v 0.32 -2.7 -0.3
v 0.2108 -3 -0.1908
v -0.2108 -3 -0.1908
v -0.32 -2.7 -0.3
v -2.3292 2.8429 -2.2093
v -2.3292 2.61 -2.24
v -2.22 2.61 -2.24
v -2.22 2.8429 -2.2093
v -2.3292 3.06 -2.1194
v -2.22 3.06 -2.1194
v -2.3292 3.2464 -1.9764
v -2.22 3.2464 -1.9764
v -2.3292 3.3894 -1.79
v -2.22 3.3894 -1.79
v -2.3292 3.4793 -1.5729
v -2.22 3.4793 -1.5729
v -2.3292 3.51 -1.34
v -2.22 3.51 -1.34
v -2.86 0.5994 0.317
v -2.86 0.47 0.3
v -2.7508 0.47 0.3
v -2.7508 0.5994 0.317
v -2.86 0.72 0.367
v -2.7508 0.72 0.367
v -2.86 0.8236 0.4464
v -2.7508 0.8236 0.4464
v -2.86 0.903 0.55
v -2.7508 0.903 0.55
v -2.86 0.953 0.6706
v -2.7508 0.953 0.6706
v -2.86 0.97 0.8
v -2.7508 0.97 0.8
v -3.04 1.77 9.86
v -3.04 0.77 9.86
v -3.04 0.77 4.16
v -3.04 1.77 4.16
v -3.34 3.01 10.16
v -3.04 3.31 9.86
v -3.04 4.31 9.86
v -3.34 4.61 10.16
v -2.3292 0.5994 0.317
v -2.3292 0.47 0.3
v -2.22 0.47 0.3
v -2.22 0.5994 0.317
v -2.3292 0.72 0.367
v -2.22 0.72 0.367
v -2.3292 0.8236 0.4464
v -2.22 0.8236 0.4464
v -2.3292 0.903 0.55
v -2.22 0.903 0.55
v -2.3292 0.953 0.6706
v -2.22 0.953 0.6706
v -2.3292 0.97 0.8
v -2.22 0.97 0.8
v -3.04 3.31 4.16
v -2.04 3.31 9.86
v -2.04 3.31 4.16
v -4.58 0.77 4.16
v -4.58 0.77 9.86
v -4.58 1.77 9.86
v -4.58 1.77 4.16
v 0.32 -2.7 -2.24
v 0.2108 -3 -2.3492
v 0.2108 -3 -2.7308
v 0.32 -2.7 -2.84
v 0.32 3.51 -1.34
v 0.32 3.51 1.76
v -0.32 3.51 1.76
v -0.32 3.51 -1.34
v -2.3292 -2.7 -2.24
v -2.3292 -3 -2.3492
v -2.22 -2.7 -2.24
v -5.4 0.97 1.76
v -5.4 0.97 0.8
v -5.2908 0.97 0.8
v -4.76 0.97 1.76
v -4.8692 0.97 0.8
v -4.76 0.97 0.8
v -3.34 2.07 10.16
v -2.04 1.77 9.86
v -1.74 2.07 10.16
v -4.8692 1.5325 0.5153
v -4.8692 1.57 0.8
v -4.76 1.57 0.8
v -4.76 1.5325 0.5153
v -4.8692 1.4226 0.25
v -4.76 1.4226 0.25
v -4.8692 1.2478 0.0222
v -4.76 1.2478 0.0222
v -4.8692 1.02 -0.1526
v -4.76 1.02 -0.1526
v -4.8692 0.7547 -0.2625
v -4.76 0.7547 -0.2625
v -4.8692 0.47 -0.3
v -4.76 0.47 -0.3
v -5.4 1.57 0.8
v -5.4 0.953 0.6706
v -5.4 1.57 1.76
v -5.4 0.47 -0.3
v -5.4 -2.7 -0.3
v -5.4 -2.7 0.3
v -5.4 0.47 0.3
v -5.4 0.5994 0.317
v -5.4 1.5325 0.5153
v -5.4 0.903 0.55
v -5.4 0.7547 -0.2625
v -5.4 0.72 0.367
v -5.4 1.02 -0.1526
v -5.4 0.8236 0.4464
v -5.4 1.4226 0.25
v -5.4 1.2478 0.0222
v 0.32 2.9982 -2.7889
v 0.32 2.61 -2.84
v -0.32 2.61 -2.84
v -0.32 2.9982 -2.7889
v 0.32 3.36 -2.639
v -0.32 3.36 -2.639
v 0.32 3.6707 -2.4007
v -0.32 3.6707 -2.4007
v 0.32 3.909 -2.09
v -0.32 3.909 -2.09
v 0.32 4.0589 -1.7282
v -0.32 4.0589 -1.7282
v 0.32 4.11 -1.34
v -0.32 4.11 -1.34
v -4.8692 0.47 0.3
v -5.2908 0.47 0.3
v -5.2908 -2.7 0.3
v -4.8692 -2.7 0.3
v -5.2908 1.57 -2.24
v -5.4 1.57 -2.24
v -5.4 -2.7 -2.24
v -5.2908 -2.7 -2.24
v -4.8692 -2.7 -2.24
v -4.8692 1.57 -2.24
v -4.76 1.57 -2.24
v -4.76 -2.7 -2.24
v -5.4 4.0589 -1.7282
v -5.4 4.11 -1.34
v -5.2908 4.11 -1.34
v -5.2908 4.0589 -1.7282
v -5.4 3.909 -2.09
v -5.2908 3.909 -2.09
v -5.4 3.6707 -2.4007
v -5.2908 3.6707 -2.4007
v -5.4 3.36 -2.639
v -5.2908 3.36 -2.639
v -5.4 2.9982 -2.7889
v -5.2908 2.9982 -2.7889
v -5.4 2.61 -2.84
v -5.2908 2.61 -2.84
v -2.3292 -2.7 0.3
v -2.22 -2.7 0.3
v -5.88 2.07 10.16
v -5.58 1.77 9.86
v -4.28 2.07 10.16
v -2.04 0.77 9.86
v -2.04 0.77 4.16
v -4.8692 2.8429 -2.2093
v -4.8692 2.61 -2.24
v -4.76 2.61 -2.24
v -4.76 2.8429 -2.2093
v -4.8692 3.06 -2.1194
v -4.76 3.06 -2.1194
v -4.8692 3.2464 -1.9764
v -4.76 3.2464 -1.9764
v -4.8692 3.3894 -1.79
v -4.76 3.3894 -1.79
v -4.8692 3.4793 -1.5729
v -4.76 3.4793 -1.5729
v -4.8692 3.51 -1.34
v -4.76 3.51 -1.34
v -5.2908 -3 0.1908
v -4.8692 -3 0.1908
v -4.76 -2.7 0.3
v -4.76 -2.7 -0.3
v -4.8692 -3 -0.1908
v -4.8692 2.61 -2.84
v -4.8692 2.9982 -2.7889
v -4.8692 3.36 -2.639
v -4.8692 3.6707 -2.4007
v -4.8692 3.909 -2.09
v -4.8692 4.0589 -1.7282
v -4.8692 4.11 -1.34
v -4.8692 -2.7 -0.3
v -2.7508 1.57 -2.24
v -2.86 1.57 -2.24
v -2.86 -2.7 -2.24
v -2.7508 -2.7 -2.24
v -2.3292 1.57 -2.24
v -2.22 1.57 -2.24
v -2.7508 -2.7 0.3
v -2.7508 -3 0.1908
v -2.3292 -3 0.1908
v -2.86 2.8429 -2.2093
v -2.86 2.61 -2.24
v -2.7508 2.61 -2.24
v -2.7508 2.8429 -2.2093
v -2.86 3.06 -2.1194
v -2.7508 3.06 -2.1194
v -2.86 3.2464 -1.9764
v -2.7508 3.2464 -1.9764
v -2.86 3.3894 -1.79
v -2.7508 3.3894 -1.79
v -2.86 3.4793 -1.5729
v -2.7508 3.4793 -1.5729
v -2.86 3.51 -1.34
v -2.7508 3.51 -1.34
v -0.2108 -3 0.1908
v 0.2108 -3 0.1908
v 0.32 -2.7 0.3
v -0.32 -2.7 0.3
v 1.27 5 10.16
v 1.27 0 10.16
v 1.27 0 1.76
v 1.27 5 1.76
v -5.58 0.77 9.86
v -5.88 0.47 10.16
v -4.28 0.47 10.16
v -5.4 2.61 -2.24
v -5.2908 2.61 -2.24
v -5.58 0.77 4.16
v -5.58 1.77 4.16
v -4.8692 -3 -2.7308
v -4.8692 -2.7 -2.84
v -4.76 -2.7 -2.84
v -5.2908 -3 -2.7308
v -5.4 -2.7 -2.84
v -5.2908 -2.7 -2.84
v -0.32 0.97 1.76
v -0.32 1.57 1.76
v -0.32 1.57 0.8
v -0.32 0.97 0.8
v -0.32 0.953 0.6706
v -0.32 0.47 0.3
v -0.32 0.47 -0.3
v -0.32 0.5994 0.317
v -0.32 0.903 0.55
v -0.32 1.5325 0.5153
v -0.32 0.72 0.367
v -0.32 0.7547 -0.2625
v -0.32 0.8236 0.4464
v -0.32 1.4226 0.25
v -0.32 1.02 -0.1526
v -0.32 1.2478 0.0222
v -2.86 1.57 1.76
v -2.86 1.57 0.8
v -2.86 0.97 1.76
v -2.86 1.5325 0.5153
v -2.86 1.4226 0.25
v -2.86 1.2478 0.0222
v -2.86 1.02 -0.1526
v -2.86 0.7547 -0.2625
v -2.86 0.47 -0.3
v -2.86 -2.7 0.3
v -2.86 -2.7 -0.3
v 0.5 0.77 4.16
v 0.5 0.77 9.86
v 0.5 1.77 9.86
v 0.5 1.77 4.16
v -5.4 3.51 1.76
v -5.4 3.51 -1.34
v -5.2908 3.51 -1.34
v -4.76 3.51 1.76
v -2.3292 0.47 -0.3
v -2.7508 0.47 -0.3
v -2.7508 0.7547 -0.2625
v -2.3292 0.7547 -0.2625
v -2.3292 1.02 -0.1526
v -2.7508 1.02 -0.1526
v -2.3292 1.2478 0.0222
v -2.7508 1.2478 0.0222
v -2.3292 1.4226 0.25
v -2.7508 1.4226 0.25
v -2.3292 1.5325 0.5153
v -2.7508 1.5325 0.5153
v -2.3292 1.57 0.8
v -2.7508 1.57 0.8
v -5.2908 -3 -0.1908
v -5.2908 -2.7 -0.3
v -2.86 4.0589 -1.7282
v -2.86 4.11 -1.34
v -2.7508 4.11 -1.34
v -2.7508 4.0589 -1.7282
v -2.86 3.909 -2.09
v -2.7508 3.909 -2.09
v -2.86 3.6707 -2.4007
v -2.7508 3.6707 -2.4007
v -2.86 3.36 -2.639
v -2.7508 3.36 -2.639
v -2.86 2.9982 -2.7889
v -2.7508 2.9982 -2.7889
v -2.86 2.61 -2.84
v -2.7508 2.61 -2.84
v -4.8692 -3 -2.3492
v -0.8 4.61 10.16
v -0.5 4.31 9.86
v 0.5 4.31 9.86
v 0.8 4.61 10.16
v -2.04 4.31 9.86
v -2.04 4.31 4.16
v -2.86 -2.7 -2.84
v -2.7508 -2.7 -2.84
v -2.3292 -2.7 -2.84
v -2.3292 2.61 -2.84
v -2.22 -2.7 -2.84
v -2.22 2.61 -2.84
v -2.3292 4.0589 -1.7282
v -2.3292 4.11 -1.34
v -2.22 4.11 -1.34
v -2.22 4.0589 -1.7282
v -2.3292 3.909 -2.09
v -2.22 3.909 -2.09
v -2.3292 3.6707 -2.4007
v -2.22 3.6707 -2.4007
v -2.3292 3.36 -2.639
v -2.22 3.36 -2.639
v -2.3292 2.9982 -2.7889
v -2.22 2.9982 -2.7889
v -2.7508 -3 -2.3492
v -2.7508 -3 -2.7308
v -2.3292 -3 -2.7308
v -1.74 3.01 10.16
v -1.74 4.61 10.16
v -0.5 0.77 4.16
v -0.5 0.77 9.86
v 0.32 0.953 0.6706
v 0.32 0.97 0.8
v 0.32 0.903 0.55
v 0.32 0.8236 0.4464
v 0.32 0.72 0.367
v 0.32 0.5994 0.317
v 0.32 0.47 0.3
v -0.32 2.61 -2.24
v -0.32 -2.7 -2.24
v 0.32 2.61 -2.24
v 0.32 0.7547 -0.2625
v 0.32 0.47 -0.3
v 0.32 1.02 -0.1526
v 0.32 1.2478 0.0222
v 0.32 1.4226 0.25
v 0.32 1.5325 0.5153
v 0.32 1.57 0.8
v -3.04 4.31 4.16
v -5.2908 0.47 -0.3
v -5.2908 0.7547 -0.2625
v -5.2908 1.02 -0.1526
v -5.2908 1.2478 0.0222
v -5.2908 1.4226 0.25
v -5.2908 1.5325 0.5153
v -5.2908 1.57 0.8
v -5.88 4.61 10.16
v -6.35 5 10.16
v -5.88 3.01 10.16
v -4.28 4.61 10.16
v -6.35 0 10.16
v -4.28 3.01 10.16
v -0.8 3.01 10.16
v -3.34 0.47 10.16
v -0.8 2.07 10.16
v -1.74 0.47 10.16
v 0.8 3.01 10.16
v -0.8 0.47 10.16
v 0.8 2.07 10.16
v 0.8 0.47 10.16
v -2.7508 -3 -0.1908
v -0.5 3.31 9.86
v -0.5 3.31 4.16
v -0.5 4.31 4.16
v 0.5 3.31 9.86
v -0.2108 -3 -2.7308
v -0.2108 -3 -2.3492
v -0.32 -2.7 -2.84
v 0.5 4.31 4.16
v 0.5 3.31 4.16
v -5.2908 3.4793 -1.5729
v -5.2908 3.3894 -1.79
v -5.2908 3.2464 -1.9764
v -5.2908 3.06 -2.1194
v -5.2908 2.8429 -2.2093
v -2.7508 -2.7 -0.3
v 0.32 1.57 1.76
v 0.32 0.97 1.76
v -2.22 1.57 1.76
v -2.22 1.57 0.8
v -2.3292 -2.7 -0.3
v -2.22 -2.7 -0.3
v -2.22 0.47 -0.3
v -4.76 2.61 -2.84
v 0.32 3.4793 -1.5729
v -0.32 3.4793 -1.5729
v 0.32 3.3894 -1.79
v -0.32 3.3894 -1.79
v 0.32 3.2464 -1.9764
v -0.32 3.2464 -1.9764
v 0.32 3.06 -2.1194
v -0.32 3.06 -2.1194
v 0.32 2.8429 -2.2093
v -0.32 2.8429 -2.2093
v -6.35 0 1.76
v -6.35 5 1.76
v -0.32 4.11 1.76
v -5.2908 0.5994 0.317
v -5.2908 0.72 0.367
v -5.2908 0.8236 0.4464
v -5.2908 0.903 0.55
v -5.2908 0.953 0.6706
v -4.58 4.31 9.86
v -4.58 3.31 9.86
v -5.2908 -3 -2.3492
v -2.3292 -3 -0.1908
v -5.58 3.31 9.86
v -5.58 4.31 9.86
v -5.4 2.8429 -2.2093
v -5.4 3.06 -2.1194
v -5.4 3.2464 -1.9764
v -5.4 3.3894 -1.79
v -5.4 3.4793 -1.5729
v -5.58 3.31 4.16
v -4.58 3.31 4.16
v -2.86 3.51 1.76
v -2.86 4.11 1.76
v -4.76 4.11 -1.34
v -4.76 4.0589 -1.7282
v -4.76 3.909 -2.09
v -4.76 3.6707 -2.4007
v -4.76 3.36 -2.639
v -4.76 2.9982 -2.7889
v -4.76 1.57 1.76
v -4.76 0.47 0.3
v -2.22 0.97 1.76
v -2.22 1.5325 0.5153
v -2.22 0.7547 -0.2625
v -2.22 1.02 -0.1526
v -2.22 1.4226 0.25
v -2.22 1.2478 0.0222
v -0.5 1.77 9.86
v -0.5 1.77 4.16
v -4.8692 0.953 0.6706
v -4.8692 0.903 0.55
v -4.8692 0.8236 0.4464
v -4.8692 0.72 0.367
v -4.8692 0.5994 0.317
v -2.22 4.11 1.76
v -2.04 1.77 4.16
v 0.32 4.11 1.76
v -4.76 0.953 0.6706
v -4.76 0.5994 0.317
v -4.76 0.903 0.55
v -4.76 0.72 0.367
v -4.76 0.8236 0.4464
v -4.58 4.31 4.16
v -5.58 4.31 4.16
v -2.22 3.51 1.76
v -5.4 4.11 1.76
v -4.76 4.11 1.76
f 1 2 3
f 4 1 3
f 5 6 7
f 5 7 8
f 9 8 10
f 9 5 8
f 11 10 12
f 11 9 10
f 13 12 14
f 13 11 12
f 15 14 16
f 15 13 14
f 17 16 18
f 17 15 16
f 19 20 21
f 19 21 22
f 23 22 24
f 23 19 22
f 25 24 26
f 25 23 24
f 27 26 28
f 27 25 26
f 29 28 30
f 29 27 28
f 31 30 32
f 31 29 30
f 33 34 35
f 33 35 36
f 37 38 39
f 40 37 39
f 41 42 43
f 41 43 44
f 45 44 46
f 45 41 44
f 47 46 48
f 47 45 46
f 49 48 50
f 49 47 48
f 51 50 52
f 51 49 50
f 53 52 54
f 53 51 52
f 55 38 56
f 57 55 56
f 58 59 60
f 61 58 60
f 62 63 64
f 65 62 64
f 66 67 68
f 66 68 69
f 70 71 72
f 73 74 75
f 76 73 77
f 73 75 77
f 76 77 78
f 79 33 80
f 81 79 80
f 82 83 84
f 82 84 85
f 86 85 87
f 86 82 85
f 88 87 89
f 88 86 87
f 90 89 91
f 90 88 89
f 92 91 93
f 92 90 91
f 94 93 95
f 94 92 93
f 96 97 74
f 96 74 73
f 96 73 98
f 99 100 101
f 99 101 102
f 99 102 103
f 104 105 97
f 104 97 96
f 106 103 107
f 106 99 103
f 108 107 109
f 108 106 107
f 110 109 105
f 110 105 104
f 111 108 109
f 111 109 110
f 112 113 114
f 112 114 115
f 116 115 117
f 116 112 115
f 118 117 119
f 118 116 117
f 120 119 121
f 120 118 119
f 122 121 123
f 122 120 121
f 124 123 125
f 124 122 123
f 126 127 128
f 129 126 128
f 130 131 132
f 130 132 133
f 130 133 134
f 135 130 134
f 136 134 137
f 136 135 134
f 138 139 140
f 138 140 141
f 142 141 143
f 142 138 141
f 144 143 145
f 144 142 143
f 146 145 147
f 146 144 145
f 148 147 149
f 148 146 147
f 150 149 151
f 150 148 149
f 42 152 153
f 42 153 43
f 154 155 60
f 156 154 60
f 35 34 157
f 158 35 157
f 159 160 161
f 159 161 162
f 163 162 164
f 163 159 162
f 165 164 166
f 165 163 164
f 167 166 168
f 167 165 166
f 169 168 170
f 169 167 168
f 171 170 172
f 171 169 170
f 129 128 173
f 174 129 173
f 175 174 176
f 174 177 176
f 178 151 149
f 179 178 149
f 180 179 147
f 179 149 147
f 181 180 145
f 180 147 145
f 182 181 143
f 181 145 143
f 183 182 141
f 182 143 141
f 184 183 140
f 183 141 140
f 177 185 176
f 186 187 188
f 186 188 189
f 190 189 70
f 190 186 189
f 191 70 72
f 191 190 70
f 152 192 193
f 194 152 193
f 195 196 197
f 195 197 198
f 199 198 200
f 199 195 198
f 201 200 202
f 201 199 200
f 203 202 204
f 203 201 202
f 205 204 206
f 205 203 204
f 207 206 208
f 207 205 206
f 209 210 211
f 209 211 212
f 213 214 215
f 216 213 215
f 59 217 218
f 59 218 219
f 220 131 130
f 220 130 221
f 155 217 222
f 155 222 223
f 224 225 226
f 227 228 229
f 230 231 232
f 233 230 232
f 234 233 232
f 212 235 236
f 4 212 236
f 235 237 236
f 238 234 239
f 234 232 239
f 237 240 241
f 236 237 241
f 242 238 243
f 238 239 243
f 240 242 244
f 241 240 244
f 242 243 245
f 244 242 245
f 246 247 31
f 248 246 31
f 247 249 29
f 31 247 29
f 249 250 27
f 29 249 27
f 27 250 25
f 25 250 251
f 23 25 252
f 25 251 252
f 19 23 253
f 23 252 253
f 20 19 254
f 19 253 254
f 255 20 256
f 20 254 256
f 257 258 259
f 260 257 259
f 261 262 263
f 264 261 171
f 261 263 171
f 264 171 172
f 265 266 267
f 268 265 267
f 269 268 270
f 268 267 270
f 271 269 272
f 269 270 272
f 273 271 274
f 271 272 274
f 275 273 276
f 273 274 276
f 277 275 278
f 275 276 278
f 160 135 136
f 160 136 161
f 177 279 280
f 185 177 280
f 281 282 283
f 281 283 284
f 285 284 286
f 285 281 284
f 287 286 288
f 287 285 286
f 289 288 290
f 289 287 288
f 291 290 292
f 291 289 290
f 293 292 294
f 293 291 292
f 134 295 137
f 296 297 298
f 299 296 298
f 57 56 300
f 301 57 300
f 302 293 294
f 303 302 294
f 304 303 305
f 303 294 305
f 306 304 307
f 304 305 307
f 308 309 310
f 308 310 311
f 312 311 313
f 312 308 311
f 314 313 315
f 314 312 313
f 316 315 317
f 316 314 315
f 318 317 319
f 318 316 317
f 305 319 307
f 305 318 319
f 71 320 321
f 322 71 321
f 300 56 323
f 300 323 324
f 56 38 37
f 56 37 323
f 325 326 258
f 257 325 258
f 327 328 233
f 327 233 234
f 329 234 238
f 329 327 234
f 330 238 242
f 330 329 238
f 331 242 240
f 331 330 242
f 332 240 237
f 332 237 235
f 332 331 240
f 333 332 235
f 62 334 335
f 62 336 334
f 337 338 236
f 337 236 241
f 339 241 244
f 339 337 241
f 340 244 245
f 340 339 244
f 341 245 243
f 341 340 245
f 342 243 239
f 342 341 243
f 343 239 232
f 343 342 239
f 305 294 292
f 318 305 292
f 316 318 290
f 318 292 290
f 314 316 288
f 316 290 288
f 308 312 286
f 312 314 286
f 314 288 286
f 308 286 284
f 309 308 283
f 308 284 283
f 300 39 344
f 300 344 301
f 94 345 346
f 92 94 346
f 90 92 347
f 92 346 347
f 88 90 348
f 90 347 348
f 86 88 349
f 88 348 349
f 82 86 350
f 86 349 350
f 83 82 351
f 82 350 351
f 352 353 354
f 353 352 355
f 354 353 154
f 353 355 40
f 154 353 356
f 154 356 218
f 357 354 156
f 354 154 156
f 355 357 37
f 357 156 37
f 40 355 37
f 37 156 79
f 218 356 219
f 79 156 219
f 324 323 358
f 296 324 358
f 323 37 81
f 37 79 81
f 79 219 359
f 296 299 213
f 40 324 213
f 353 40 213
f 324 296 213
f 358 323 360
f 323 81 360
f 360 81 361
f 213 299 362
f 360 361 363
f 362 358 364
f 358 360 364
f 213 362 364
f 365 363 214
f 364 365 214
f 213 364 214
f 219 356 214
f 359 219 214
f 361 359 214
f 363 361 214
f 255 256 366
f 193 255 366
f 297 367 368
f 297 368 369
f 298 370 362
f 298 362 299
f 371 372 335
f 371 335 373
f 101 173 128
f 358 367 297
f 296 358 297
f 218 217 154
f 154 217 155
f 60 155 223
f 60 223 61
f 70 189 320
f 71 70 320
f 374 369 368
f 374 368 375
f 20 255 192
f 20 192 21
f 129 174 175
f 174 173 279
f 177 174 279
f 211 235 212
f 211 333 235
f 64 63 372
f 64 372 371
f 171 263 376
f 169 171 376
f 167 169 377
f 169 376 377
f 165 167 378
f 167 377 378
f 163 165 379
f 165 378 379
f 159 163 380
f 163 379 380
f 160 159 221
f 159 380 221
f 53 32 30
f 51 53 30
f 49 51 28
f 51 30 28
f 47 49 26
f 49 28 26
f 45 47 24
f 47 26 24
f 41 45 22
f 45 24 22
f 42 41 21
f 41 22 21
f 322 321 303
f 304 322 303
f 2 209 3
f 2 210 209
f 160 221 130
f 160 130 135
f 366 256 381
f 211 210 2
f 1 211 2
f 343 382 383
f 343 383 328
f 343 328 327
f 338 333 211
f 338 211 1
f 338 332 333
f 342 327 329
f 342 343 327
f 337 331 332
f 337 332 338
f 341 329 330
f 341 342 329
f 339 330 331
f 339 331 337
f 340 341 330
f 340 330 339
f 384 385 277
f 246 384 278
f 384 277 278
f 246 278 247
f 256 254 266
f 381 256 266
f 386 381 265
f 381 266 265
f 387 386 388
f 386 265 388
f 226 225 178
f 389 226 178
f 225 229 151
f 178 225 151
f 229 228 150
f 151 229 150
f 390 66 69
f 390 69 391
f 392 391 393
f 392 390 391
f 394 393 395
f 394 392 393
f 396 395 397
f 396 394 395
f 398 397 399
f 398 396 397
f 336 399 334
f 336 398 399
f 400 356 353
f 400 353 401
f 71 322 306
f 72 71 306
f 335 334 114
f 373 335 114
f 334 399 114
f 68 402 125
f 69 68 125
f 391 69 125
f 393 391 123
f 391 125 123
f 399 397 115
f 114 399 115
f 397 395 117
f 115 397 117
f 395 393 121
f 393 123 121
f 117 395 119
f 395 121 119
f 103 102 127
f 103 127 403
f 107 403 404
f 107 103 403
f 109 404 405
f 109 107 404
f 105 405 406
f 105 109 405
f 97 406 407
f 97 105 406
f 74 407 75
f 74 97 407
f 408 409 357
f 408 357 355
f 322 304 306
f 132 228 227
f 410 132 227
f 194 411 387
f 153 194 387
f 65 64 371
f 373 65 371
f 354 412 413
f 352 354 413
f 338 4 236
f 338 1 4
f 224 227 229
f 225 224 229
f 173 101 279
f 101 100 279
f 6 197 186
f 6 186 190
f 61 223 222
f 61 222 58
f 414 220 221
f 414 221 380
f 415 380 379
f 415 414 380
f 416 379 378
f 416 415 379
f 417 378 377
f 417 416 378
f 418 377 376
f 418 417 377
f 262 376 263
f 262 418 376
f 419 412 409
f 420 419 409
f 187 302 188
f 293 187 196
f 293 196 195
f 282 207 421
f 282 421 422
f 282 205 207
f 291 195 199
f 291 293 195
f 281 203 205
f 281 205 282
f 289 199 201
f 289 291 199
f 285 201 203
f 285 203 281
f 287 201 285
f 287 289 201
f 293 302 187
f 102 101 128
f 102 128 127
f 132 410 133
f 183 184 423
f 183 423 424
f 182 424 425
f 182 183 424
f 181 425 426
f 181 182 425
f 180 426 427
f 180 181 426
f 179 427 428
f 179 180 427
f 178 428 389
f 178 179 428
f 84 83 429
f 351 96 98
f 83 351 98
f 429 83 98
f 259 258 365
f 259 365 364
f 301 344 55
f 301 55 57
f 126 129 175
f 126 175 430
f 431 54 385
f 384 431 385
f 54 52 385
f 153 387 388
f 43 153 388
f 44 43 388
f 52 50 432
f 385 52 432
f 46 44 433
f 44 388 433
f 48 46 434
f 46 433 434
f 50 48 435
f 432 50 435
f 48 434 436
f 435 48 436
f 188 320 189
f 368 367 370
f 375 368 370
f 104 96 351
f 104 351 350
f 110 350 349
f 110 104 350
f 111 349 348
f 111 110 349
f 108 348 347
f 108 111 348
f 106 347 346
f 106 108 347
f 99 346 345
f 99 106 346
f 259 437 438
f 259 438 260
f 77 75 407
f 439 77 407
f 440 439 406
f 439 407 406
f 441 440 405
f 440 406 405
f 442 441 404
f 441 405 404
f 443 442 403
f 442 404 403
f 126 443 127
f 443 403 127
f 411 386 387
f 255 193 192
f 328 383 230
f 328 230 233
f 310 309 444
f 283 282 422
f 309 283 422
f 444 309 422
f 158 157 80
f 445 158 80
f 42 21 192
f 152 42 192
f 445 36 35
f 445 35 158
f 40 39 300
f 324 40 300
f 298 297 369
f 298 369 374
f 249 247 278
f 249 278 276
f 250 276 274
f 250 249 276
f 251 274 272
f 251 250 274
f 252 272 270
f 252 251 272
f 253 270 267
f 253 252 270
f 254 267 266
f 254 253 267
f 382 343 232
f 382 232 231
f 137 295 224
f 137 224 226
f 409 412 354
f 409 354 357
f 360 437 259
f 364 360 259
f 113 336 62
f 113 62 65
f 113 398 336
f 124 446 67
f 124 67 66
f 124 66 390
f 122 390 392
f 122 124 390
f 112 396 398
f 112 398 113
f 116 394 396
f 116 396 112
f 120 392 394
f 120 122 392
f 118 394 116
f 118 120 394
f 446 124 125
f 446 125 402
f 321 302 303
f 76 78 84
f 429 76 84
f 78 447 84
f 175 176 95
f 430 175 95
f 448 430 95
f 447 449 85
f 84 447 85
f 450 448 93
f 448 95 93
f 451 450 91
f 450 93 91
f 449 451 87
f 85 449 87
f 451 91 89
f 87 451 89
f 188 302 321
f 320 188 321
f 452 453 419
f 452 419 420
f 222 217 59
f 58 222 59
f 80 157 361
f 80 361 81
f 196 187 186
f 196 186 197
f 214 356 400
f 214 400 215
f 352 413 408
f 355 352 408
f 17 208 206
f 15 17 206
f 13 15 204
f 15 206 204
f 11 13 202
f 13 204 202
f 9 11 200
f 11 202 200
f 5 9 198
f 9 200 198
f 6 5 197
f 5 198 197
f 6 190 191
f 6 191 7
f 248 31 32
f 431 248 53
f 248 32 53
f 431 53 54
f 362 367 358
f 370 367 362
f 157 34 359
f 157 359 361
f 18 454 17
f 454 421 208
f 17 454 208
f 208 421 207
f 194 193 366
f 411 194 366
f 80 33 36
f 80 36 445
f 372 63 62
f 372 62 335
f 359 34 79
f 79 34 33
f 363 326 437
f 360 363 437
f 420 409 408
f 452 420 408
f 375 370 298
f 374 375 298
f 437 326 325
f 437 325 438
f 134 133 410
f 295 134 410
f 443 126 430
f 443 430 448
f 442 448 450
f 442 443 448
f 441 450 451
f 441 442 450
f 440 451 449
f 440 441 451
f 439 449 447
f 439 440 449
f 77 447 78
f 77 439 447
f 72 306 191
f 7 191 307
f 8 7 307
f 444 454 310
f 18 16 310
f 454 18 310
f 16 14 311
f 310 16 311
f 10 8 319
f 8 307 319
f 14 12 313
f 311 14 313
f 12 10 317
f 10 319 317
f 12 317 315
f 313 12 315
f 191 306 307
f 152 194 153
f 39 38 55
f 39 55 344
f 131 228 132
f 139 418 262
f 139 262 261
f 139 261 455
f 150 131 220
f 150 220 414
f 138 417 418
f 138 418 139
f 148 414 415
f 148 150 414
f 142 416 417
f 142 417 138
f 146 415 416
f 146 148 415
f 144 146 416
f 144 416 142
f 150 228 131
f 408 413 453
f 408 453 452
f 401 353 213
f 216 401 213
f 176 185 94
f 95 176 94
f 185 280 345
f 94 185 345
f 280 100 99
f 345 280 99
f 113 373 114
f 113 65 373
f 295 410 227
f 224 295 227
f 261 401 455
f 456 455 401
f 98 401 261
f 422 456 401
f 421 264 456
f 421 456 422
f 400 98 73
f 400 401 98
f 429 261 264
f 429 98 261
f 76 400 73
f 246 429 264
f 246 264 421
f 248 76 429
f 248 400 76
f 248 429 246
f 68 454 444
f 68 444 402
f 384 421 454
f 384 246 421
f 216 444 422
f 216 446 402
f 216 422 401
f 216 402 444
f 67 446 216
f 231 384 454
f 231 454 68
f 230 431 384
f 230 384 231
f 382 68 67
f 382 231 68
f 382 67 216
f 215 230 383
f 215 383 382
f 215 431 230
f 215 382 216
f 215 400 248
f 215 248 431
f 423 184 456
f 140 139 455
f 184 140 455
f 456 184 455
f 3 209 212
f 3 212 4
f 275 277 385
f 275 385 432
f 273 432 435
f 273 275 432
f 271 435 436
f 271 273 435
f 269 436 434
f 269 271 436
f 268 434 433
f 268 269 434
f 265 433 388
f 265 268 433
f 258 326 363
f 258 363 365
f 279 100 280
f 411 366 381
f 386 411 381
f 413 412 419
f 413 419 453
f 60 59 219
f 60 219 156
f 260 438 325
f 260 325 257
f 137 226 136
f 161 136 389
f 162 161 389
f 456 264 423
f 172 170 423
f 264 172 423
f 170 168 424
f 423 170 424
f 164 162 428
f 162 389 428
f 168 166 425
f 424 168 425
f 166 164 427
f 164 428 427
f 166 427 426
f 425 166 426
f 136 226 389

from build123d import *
from OCP.BRepFilletAPI import BRepFilletAPI_MakeChamfer
from build123d.topology import SkipClean

# Parameters (mm, degrees)
EXTRUDE_2563_DEPTH                    = 0.32
EXTRUDE_2563_2_DEPTH                  = 0.32
SKETCH_2_W                            = 2.54
SKETCH_2_H                            = 8.4
EXTRUDE_2921_DEPTH                    = 5
SKETCH_3_W                            = 1
SKETCH_3_H                            = 1
CUT_EXTRUDE_3170_DEPTH                = 6
CHAMFER_1_SIZE                        = 0.3
CHAMFER_2_SIZE                        = 0.3
CHAMFER_2_SIZE2                       = 0.10919107
PATTERN_LINEAR_3747_COUNT             = 3
PATTERN_LINEAR_3747_PITCH             = 2.54
CHAMFER_1_OF_PATTERN_LINEAR_3747_SIZE = 0.3
PATTERN_START                         = -5.29080893
PATTERN_LINEAR_12180_DEPTH            = 0.42161786
PATTERN_START_2                       = -2.75080893
PATTERN_LINEAR_12180_2_DEPTH          = 0.42161786
PATTERN_START_3                       = -0.19080893
PATTERN_LINEAR_12180_3_OUTLINE_W      = 0.10919107
PATTERN_LINEAR_12180_3_OUTLINE_H      = 0.6
PATTERN_LINEAR_12180_3_DEPTH          = 0.99080893
PATTERN_START_4                       = -2.84
PATTERN_LINEAR_12180_4_DEPTH          = 0.6
PATTERN_START_5                       = -2.73080893
PATTERN_LINEAR_12180_5_OUTLINE_W      = 0.10919107
PATTERN_LINEAR_12180_5_OUTLINE_H      = 2.54
PATTERN_LINEAR_12180_5_DEPTH          = 1.39080893
PATTERN_START_6                       = -1.484615596
PATTERN_LINEAR_12180_6_OUTLINE_W      = 0.10919107
PATTERN_LINEAR_12180_6_OUTLINE_H      = 0.6
PATTERN_LINEAR_12180_6_DEPTH          = 4.484615596
PATTERN_START_7                       = 0.719658002
PATTERN_LINEAR_12180_7_OUTLINE_W      = 0.10919107
PATTERN_LINEAR_12180_7_OUTLINE_H      = 0.6
PATTERN_LINEAR_12180_7_DEPTH          = 2.280341998
PATTERN_START_8                       = -0.3
PATTERN_LINEAR_12180_8_DEPTH          = 0.49080893
PATTERN_START_9                       = -5.4
PATTERN_LINEAR_12180_9_DEPTH          = 3.18


with BuildPart() as part:
    # Эскиз1 → Extrude 2563 (new, symmetric)
    with BuildSketch(Plane(origin=(0, 0, 0), x_dir=(0, 0, -1), z_dir=(1, 0, 0))):
        with BuildLine():
            Line((0.3, -3), (0.3, 0.47))
            ThreePointArc((0.3, 0.47), (-0.022182541, 1.247817459), (-0.8, 1.57))
            Line((-0.8, 1.57), (-4.16, 1.57))
            Line((-4.16, 1.57), (-4.16, 0.97))
            Line((-4.16, 0.97), (-0.8, 0.97))
            ThreePointArc((-0.8, 0.97), (-0.446446609, 0.823553391), (-0.3, 0.47))
            Line((-0.3, 0.47), (-0.3, -3))
            Line((-0.3, -3), (0.3, -3))
        make_face()
    extrude(amount=EXTRUDE_2563_DEPTH, both=True)



with BuildPart() as body_2:
    # Эскиз1 → Extrude 2563 2 (new, symmetric)
    with BuildSketch(Plane(origin=(0, 0, 0), x_dir=(0, 0, -1), z_dir=(1, 0, 0))):
        with BuildLine():
            Line((2.84, -3), (2.84, 2.61))
            ThreePointArc((2.84, 2.61), (2.400660172, 3.670660172), (1.34, 4.11))
            Line((1.34, 4.11), (-4.16, 4.11))
            Line((-4.16, 4.11), (-4.16, 3.51))
            Line((-4.16, 3.51), (1.34, 3.51))
            ThreePointArc((1.34, 3.51), (1.976396103, 3.246396103), (2.24, 2.61))
            Line((2.24, 2.61), (2.24, -3))
            Line((2.24, -3), (2.84, -3))
        make_face()
    extrude(amount=EXTRUDE_2563_2_DEPTH, both=True)


with BuildPart() as part_1:
    add(part.part)

    add(body_2.part)  # Extrude 2921 merges body 2
    # Эскиз2 → Extrude 2921 (add)
    with BuildSketch(Plane(origin=(0, 0, 0), x_dir=(1, 0, 0), z_dir=(0, 1, 0))):
        with Locations((0, -5.96)):
            Rectangle(SKETCH_2_W, SKETCH_2_H)
    extrude_2921 = extrude(amount=EXTRUDE_2921_DEPTH)

    # Эскиз3 → Cut-Extrude 3170 (cut)
    with BuildSketch(Plane.XY.offset(10.16)):
        with Locations((0, 1.27)):
            Rectangle(SKETCH_3_W, SKETCH_3_H)
        with Locations((0, 3.81)):
            Rectangle(SKETCH_3_W, SKETCH_3_H)
    cut_extrude_3170 = extrude(amount=-CUT_EXTRUDE_3170_DEPTH, mode=Mode.SUBTRACT)

    # Фаска1
    chamfer_1_edges = [part_1.edges().sort_by_distance(p)[0] for p in [
        (-0.5, 1.27, 10.16),
        (0, 0.77, 10.16),
        (0.5, 1.27, 10.16),
        (0, 1.77, 10.16),
        (-0.5, 3.81, 10.16),
        (0, 3.31, 10.16),
        (0.5, 3.81, 10.16),
        (0, 4.31, 10.16),
    ]]
    chamfer(chamfer_1_edges, length=CHAMFER_1_SIZE)

    # Фаска2: one chamfer whose edges measure the first distance from different faces: ONE call of the kernel's chamfer builder (chamfer() names one face for all edges)
    chamfer_2_edges_1 = [part_1.edges().sort_by_distance(p)[0] for p in [
        (-0.32, -3, 0),
    ]]
    chamfer_2_side_1 = [part_1.faces().sort_by_distance(p)[0] for p in [
        (-0.32, -0.335827759, 0.275050022),
    ]]
    chamfer_2_edges_2 = [part_1.edges().sort_by_distance(p)[0] for p in [
        (0, -3, 0.3),
    ]]
    chamfer_2_side_2 = [part_1.faces().sort_by_distance(p)[0] for p in [
        (0, -1.265, 0.3),
    ]]
    chamfer_2_edges_3 = [part_1.edges().sort_by_distance(p)[0] for p in [
        (0, -3, -0.3),
    ]]
    chamfer_2_side_3 = [part_1.faces().sort_by_distance(p)[0] for p in [
        (0, -1.265, -0.3),
    ]]
    chamfer_2_edges_4 = [part_1.edges().sort_by_distance(p)[0] for p in [
        (0.32, -3, 0),
    ]]
    chamfer_2_side_4 = [part_1.faces().sort_by_distance(p)[0] for p in [
        (0.32, -0.335827759, 0.275050022),
    ]]
    chamfer_2_edges_5 = [part_1.edges().sort_by_distance(p)[0] for p in [
        (0.32, -3, -2.54),
    ]]
    chamfer_2_side_5 = [part_1.faces().sort_by_distance(p)[0] for p in [
        (0.32, -2.915317003, -2.54),
    ]]
    chamfer_2_edges_6 = [part_1.edges().sort_by_distance(p)[0] for p in [
        (-0.32, -3, -2.54),
    ]]
    chamfer_2_side_6 = [part_1.faces().sort_by_distance(p)[0] for p in [
        (-0.32, -2.915317003, -2.54),
    ]]
    chamfer_2_edges_7 = [part_1.edges().sort_by_distance(p)[0] for p in [
        (0, -3, -2.24),
    ]]
    chamfer_2_side_7 = [part_1.faces().sort_by_distance(p)[0] for p in [
        (0, -0.195, -2.24),
    ]]
    chamfer_2_edges_8 = [part_1.edges().sort_by_distance(p)[0] for p in [
        (0, -3, -2.84),
    ]]
    chamfer_2_side_8 = [part_1.faces().sort_by_distance(p)[0] for p in [
        (0, -0.195, -2.84),
    ]]
    chamfer_2 = BRepFilletAPI_MakeChamfer(part_1.part.solid().wrapped)
    for e in chamfer_2_edges_1:
        chamfer_2.Add(CHAMFER_2_SIZE, CHAMFER_2_SIZE2, e.wrapped, chamfer_2_side_1[0].wrapped)  # the first distance lies on this face
    for e in chamfer_2_edges_2:
        chamfer_2.Add(CHAMFER_2_SIZE, CHAMFER_2_SIZE2, e.wrapped, chamfer_2_side_2[0].wrapped)  # the first distance lies on this face
    for e in chamfer_2_edges_3:
        chamfer_2.Add(CHAMFER_2_SIZE, CHAMFER_2_SIZE2, e.wrapped, chamfer_2_side_3[0].wrapped)  # the first distance lies on this face
    for e in chamfer_2_edges_4:
        chamfer_2.Add(CHAMFER_2_SIZE, CHAMFER_2_SIZE2, e.wrapped, chamfer_2_side_4[0].wrapped)  # the first distance lies on this face
    for e in chamfer_2_edges_5:
        chamfer_2.Add(CHAMFER_2_SIZE, CHAMFER_2_SIZE2, e.wrapped, chamfer_2_side_5[0].wrapped)  # the first distance lies on this face
    for e in chamfer_2_edges_6:
        chamfer_2.Add(CHAMFER_2_SIZE, CHAMFER_2_SIZE2, e.wrapped, chamfer_2_side_6[0].wrapped)  # the first distance lies on this face
    for e in chamfer_2_edges_7:
        chamfer_2.Add(CHAMFER_2_SIZE, CHAMFER_2_SIZE2, e.wrapped, chamfer_2_side_7[0].wrapped)  # the first distance lies on this face
    for e in chamfer_2_edges_8:
        chamfer_2.Add(CHAMFER_2_SIZE, CHAMFER_2_SIZE2, e.wrapped, chamfer_2_side_8[0].wrapped)  # the first distance lies on this face
    add(Compound.cast(chamfer_2.Shape()), mode=Mode.REPLACE)

    # Pattern Linear 3747: Extrude 2921, Cut-Extrude 3170 ×3
    with Locations(*[(-i * PATTERN_LINEAR_3747_PITCH, 0, 0) for i in range(1, PATTERN_LINEAR_3747_COUNT)]):
        add(extrude_2921)
        add(cut_extrude_3170, mode=Mode.SUBTRACT)

    # Фаска1 of Pattern Linear 3747
    chamfer_1_of_pattern_linear_3747_edges = [part_1.edges().sort_by_distance(p)[0] for p in [
        (-3.04, 1.27, 10.16),
        (-2.54, 0.77, 10.16),
        (-2.04, 1.27, 10.16),
        (-2.54, 1.77, 10.16),
        (-3.04, 3.81, 10.16),
        (-2.54, 3.31, 10.16),
        (-2.04, 3.81, 10.16),
        (-2.54, 4.31, 10.16),
        (-5.58, 1.27, 10.16),
        (-5.08, 0.77, 10.16),
        (-4.58, 1.27, 10.16),
        (-5.08, 1.77, 10.16),
        (-5.58, 3.81, 10.16),
        (-5.08, 3.31, 10.16),
        (-4.58, 3.81, 10.16),
        (-5.08, 4.31, 10.16),
    ]]
    chamfer(chamfer_1_of_pattern_linear_3747_edges, length=CHAMFER_1_OF_PATTERN_LINEAR_3747_SIZE)

    # Pattern Linear 12180: read off the stored shape, not the designer's step
    # Pattern Linear 12180 outline → Pattern Linear 12180 (add)
    with BuildSketch(Plane.YZ.offset(PATTERN_START)):
        with BuildLine():
            Line((4.11, 1.76), (3.51, 1.76))
            Line((3.51, 1.76), (3.51, -1.34))
            ThreePointArc((3.51, -1.34), (3.246396103, -1.976396103), (2.61, -2.24))
            Line((2.61, -2.24), (-2.7, -2.24))
            Line((-2.7, -2.24), (-3, -2.34919107))
            Line((-3, -2.34919107), (-3, -2.73080893))
            Line((-3, -2.73080893), (-2.7, -2.84))
            Line((-2.7, -2.84), (2.61, -2.84))
            ThreePointArc((2.61, -2.84), (3.670660172, -2.400660172), (4.11, -1.34))
            Line((4.11, -1.34), (4.11, 1.76))
        make_face()
        with BuildLine():
            Line((1.57, 0.8), (1.57, 1.76))
            Line((1.57, 1.76), (0.97, 1.76))
            Line((0.97, 1.76), (0.97, 0.8))
            ThreePointArc((0.97, 0.8), (0.823553391, 0.446446609), (0.47, 0.3))
            Line((0.47, 0.3), (-2.7, 0.3))
            Line((-2.7, 0.3), (-3, 0.19080893))
            Line((-3, 0.19080893), (-3, -0.19080893))
            Line((-3, -0.19080893), (-2.7, -0.3))
            Line((-2.7, -0.3), (0.47, -0.3))
            ThreePointArc((0.47, -0.3), (1.247817459, 0.022182541), (1.57, 0.8))
        make_face()
    extrude(amount=PATTERN_LINEAR_12180_DEPTH)

    # Pattern Linear 12180 2 outline → Pattern Linear 12180 2 (add)
    with BuildSketch(Plane.YZ.offset(PATTERN_START_2)):
        with BuildLine():
            Line((4.11, 1.76), (3.51, 1.76))
            Line((3.51, 1.76), (3.51, -1.34))
            ThreePointArc((3.51, -1.34), (3.246396103, -1.976396103), (2.61, -2.24))
            Line((2.61, -2.24), (-2.7, -2.24))
            Line((-2.7, -2.24), (-3, -2.34919107))
            Line((-3, -2.34919107), (-3, -2.73080893))
            Line((-3, -2.73080893), (-2.7, -2.84))
            Line((-2.7, -2.84), (2.61, -2.84))
            ThreePointArc((2.61, -2.84), (3.670660172, -2.400660172), (4.11, -1.34))
            Line((4.11, -1.34), (4.11, 1.76))
        make_face()
        with BuildLine():
            Line((1.57, 0.8), (1.57, 1.76))
            Line((1.57, 1.76), (0.97, 1.76))
            Line((0.97, 1.76), (0.97, 0.8))
            ThreePointArc((0.97, 0.8), (0.823553391, 0.446446609), (0.47, 0.3))
            Line((0.47, 0.3), (-2.7, 0.3))
            Line((-2.7, 0.3), (-3, 0.19080893))
            Line((-3, 0.19080893), (-3, -0.19080893))
            Line((-3, -0.19080893), (-2.7, -0.3))
            Line((-2.7, -0.3), (0.47, -0.3))
            ThreePointArc((0.47, -0.3), (1.247817459, 0.022182541), (1.57, 0.8))
        make_face()
    extrude(amount=PATTERN_LINEAR_12180_2_DEPTH)

    # Pattern Linear 12180 3 outline → Pattern Linear 12180 3 (add)
    with BuildSketch(Plane.XY.offset(PATTERN_START_3)):
        Polygon((-2.75080893, 1.57), (-2.86, 1.57), (-2.86, -2.7), (-2.75080893, -3), align=None)
        with Locations((-2.805404465, 3.81)):
            Rectangle(PATTERN_LINEAR_12180_3_OUTLINE_W, PATTERN_LINEAR_12180_3_OUTLINE_H)
        Polygon((-2.22, 1.57), (-2.32919107, 1.57), (-2.32919107, -3), (-2.22, -2.7), align=None)
        with Locations((-2.274595535, 3.81)):
            Rectangle(PATTERN_LINEAR_12180_3_OUTLINE_W, PATTERN_LINEAR_12180_3_OUTLINE_H)
        Polygon((-5.29080893, 1.57), (-5.4, 1.57), (-5.4, -2.7), (-5.29080893, -3), align=None)
        with Locations((-5.345404465, 3.81)):
            Rectangle(PATTERN_LINEAR_12180_3_OUTLINE_W, PATTERN_LINEAR_12180_3_OUTLINE_H)
        Polygon((-4.76, 1.57), (-4.86919107, 1.57), (-4.86919107, -3), (-4.76, -2.7), align=None)
        with Locations((-4.814595535, 3.81)):
            Rectangle(PATTERN_LINEAR_12180_3_OUTLINE_W, PATTERN_LINEAR_12180_3_OUTLINE_H)
    extrude(amount=PATTERN_LINEAR_12180_3_DEPTH)

    # Pattern Linear 12180 4 outline → Pattern Linear 12180 4 (add)
    with BuildSketch(Plane.XY.offset(PATTERN_START_4)):
        Polygon((-2.86, 3.51), (-2.86, -2.7), (-2.75080893, -3), (-2.75080893, 3.51), align=None)
        Polygon((-2.32919107, 3.51), (-2.32919107, -3), (-2.22, -2.7), (-2.22, 3.51), align=None)
        Polygon((-5.4, 3.51), (-5.4, -2.7), (-5.29080893, -3), (-5.29080893, 3.51), align=None)
        Polygon((-4.86919107, 3.51), (-4.86919107, -3), (-4.76, -2.7), (-4.76, 3.51), align=None)
    extrude(amount=PATTERN_LINEAR_12180_4_DEPTH)

    # Pattern Linear 12180 5 outline → Pattern Linear 12180 5 (add)
    with BuildSketch(Plane.XY.offset(PATTERN_START_5)):
        with Locations((-2.805404465, 2.84)):
            Rectangle(PATTERN_LINEAR_12180_5_OUTLINE_W, PATTERN_LINEAR_12180_5_OUTLINE_H)
        with Locations((-2.274595535, 2.84)):
            Rectangle(PATTERN_LINEAR_12180_5_OUTLINE_W, PATTERN_LINEAR_12180_5_OUTLINE_H)
        with Locations((-5.345404465, 2.84)):
            Rectangle(PATTERN_LINEAR_12180_5_OUTLINE_W, PATTERN_LINEAR_12180_5_OUTLINE_H)
        with Locations((-4.814595535, 2.84)):
            Rectangle(PATTERN_LINEAR_12180_5_OUTLINE_W, PATTERN_LINEAR_12180_5_OUTLINE_H)
    extrude(amount=PATTERN_LINEAR_12180_5_DEPTH)

    # Pattern Linear 12180 6 outline → Pattern Linear 12180 6 (add)
    with BuildSketch(Plane.XY.offset(PATTERN_START_6)):
        with Locations((-2.805404465, 3.81)):
            Rectangle(PATTERN_LINEAR_12180_6_OUTLINE_W, PATTERN_LINEAR_12180_6_OUTLINE_H)
        with Locations((-2.274595535, 3.81)):
            Rectangle(PATTERN_LINEAR_12180_6_OUTLINE_W, PATTERN_LINEAR_12180_6_OUTLINE_H)
        with Locations((-5.345404465, 3.81)):
            Rectangle(PATTERN_LINEAR_12180_6_OUTLINE_W, PATTERN_LINEAR_12180_6_OUTLINE_H)
        with Locations((-4.814595535, 3.81)):
            Rectangle(PATTERN_LINEAR_12180_6_OUTLINE_W, PATTERN_LINEAR_12180_6_OUTLINE_H)
    extrude(amount=PATTERN_LINEAR_12180_6_DEPTH)

    # Pattern Linear 12180 7 outline → Pattern Linear 12180 7 (add)
    with BuildSketch(Plane.XY.offset(PATTERN_START_7)):
        with Locations((-2.805404465, 1.27)):
            Rectangle(PATTERN_LINEAR_12180_7_OUTLINE_W, PATTERN_LINEAR_12180_7_OUTLINE_H)
        with Locations((-2.274595535, 1.27)):
            Rectangle(PATTERN_LINEAR_12180_7_OUTLINE_W, PATTERN_LINEAR_12180_7_OUTLINE_H)
        with Locations((-5.345404465, 1.27)):
            Rectangle(PATTERN_LINEAR_12180_7_OUTLINE_W, PATTERN_LINEAR_12180_7_OUTLINE_H)
        with Locations((-4.814595535, 1.27)):
            Rectangle(PATTERN_LINEAR_12180_7_OUTLINE_W, PATTERN_LINEAR_12180_7_OUTLINE_H)
    extrude(amount=PATTERN_LINEAR_12180_7_DEPTH)

    # Pattern Linear 12180 8 outline → Pattern Linear 12180 8 (add)
    with BuildSketch(Plane.XY.offset(PATTERN_START_8)):
        Polygon((-2.75080893, 0.97), (-2.86, 0.97), (-2.86, -2.7), (-2.75080893, -3), align=None)
        Polygon((-2.22, 0.97), (-2.32919107, 0.97), (-2.32919107, -3), (-2.22, -2.7), align=None)
        Polygon((-5.29080893, 0.97), (-5.4, 0.97), (-5.4, -2.7), (-5.29080893, -3), align=None)
        Polygon((-4.76, 0.97), (-4.86919107, 0.97), (-4.86919107, -3), (-4.76, -2.7), align=None)
    extrude(amount=PATTERN_LINEAR_12180_8_DEPTH)

    # Pattern Linear 12180 9 outline → Pattern Linear 12180 9 (cut)
    with SkipClean():  # the faces are left unmerged after this step: merging them gives an invalid solid
        with BuildSketch(Plane.YZ.offset(PATTERN_START_9)):
            with BuildLine():
                ThreePointArc((4.11, -1.34), (3.670660172, -2.400660172), (2.61, -2.84))
                Line((2.61, -2.84), (3.51, -2.84))
                Line((3.51, -2.84), (3.51, -2.73080893))
                Line((3.51, -2.73080893), (4.11, -2.73080893))
                Line((4.11, -2.73080893), (4.11, -1.34))
            make_face()
            Polygon((-3, -2.84), (-2.7, -2.84), (-3, -2.73080893), align=None)
            Polygon((-3, -2.34919107), (-2.7, -2.24), (-3, -2.24), align=None)
            with BuildLine():
                Line((1.57, -1.34), (1.57, -2.24))
                Line((1.57, -2.24), (2.61, -2.24))
                ThreePointArc((2.61, -2.24), (3.246396103, -1.976396103), (3.51, -1.34))
                Line((3.51, -1.34), (1.57, -1.34))
            make_face()
            Polygon((-3, -0.19080893), (-3, -0.3), (-2.7, -0.3), align=None)
            with BuildLine():
                ThreePointArc((1.57, 0.8), (1.247817459, 0.022182541), (0.47, -0.3))
                Line((0.47, -0.3), (0.97, -0.3))
                Line((0.97, -0.3), (0.97, -0.19080893))
                Line((0.97, -0.19080893), (1.57, -0.19080893))
                Line((1.57, -0.19080893), (1.57, 0.8))
            make_face()
            with BuildLine():
                Line((0.97, 0.8), (-3, 0.8))
                Line((-3, 0.8), (-3, 0.19080893))
                Line((-3, 0.19080893), (-2.7, 0.3))
                Line((-2.7, 0.3), (0.47, 0.3))
                ThreePointArc((0.47, 0.3), (0.823553391, 0.446446609), (0.97, 0.8))
            make_face()
        extrude(amount=PATTERN_LINEAR_12180_9_DEPTH, mode=Mode.SUBTRACT)


solid = part_1.part
